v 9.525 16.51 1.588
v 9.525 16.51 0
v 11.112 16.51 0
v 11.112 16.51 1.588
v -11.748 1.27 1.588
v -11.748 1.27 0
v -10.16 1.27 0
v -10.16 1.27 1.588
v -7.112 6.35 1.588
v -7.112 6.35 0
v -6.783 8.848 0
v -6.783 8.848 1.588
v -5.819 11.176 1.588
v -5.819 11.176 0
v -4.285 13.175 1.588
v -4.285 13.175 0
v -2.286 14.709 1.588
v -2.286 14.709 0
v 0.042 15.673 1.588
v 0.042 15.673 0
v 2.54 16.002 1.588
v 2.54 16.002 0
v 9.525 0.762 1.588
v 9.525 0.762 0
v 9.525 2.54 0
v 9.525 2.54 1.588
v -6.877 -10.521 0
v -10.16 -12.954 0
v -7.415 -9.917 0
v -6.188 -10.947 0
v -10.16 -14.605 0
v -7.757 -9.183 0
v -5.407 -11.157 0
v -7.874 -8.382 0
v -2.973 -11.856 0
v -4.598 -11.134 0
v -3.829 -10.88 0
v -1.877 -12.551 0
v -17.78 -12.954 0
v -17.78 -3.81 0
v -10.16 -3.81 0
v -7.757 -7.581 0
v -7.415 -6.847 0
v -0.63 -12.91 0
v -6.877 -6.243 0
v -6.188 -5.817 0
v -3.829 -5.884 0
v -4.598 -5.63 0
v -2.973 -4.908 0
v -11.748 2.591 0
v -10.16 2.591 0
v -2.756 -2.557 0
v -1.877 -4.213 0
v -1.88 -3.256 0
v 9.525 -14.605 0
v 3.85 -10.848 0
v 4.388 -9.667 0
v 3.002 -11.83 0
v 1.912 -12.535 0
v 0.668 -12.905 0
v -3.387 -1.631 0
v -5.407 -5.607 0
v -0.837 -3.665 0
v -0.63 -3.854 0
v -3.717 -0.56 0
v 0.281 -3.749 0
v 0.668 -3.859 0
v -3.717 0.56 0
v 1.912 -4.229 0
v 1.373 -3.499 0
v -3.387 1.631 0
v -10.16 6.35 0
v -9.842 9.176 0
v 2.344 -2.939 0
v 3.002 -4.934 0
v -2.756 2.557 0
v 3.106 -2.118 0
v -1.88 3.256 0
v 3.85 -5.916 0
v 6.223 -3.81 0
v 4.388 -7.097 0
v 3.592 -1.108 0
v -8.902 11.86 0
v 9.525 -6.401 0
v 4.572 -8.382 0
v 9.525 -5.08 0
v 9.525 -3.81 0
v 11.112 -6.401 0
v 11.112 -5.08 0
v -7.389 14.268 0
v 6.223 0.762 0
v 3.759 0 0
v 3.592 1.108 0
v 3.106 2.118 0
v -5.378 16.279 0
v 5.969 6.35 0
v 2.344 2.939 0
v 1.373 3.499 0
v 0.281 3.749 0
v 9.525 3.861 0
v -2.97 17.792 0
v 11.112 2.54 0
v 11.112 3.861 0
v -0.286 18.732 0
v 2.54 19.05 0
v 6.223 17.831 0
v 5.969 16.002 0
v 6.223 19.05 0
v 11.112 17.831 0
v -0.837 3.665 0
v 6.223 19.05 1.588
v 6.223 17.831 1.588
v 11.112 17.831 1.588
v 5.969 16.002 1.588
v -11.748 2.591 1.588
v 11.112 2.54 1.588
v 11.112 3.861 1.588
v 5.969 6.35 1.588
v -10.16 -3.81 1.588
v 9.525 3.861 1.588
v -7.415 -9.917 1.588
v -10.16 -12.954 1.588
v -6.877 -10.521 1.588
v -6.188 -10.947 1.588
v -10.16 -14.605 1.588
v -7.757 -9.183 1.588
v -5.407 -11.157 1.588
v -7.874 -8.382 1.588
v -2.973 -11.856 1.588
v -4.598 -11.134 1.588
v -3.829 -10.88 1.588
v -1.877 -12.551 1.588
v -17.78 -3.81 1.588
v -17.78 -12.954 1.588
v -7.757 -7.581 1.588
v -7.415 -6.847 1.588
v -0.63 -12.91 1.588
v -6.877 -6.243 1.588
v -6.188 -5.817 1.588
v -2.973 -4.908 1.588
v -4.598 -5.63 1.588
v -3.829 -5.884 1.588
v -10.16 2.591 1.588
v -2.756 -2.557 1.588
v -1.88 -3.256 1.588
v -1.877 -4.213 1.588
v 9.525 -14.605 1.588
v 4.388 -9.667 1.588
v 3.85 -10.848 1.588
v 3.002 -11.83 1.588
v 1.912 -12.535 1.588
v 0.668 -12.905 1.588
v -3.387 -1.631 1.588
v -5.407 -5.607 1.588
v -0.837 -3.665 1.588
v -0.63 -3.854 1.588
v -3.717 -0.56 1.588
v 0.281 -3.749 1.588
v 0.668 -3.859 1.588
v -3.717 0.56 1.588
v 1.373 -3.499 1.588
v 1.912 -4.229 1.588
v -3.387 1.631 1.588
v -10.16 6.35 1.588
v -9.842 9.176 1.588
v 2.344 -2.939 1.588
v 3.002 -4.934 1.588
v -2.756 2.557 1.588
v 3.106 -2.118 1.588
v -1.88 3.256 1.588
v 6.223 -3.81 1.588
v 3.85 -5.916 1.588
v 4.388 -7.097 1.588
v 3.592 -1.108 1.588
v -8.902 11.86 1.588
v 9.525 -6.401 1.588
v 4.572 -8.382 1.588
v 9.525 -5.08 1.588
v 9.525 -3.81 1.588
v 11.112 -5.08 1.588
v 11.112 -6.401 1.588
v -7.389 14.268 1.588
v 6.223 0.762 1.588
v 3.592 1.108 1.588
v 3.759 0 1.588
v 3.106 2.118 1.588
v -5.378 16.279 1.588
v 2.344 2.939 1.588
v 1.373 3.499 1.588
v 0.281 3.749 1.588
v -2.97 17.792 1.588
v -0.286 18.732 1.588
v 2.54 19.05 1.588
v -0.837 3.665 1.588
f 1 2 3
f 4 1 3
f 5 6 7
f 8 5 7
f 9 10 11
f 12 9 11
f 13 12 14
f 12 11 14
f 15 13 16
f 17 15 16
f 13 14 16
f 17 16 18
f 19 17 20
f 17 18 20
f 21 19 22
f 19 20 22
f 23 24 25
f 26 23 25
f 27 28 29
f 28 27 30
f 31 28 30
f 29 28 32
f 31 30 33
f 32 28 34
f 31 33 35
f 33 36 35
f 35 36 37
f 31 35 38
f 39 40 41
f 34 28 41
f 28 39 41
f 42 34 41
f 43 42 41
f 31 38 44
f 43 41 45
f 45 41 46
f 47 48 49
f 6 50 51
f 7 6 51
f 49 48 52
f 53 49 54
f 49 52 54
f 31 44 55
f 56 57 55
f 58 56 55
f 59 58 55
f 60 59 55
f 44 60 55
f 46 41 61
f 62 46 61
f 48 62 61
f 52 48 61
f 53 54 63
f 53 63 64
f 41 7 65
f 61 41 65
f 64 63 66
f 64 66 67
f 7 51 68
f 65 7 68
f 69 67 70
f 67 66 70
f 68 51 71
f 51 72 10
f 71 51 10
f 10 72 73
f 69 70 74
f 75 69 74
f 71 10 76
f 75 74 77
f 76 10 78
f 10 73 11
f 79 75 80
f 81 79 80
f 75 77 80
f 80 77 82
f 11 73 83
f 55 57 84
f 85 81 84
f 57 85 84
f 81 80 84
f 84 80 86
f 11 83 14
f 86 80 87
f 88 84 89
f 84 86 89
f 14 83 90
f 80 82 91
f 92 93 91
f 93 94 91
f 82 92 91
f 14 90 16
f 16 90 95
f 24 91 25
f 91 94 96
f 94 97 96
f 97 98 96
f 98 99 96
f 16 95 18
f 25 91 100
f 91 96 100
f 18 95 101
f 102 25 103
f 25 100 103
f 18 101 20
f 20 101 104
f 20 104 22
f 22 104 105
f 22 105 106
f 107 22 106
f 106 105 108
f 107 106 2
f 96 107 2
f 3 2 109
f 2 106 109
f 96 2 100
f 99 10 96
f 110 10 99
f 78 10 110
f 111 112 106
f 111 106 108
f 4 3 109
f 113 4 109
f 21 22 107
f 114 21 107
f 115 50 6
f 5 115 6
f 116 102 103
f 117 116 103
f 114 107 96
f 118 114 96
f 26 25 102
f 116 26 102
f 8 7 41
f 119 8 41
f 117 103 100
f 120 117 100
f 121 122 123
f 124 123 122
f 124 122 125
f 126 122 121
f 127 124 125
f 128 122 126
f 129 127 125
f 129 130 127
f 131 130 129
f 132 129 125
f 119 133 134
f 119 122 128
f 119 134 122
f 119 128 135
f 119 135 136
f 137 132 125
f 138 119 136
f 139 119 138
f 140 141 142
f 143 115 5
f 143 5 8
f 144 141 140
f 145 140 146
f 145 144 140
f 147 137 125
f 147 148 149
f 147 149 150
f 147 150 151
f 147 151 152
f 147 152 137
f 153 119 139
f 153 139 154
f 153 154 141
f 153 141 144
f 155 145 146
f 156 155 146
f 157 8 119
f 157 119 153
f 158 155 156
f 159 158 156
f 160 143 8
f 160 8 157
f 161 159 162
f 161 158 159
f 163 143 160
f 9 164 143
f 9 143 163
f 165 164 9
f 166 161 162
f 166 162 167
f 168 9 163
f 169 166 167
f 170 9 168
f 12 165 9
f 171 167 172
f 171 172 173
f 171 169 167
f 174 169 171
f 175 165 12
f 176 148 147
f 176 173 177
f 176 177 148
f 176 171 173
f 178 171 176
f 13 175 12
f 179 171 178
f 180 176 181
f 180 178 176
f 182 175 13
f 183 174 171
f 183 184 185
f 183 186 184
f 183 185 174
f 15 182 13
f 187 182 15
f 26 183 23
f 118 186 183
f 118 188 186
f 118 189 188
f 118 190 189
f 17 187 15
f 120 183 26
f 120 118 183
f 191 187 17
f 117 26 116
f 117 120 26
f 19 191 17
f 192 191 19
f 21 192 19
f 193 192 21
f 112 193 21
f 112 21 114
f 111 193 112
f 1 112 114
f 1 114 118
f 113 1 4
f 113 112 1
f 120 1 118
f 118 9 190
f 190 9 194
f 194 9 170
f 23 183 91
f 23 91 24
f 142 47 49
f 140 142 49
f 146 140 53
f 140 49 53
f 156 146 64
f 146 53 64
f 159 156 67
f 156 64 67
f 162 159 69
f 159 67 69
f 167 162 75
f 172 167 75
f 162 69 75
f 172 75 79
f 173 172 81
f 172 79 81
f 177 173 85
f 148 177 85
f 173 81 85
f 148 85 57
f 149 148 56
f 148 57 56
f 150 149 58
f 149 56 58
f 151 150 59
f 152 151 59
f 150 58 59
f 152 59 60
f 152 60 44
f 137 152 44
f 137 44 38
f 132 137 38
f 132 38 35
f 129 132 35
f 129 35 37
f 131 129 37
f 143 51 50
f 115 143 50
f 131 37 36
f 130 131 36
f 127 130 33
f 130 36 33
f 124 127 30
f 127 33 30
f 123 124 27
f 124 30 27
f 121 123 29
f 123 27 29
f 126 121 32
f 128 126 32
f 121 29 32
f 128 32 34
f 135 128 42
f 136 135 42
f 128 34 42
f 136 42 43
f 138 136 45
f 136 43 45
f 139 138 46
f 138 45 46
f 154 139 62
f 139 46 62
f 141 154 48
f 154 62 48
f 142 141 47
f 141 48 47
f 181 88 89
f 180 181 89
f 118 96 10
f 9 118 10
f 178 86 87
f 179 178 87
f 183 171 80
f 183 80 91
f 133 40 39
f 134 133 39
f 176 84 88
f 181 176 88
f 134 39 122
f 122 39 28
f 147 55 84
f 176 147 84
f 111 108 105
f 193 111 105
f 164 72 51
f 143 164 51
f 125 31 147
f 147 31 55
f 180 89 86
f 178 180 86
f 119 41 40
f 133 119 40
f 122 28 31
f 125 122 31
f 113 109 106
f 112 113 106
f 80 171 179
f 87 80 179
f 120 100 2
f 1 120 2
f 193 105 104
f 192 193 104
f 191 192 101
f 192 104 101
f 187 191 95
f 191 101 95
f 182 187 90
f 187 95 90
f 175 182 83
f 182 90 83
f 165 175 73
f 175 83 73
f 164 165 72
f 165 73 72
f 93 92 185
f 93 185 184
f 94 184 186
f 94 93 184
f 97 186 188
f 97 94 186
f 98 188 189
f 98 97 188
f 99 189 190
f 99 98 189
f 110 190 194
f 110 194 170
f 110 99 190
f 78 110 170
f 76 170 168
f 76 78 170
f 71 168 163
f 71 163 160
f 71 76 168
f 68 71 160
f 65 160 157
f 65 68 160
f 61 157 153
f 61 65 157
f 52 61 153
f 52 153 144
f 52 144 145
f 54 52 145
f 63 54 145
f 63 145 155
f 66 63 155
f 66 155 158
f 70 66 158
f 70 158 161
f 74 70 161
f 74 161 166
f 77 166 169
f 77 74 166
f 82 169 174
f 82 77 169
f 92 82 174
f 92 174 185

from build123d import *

# Parameters (mm, degrees)
SKETCH1_R           = 3.7592
BOSS_EXTRUDE1_DEPTH = 1.5875
CUT_EXTRUDE1_REACH  = 28.107
SKETCH2_W           = 3.302
SKETCH2_H           = 4.572
SKETCH2_H_2         = 3.7592


with BuildPart() as part:
    # Sketch1 → Boss-Extrude1 (new body)
    with BuildSketch(Plane.XY):
        with BuildLine():
            Line((11.112499999, 17.8308), (9.524999999, 17.8308))
            Line((9.524999999, 17.8308), (9.524999999, 19.05))
            Line((9.524999999, 19.05), (2.54, 19.05))
            ThreePointArc((2.54, 19.05), (-6.440256121, 15.330256121), (-10.16, 6.35))
            Line((-10.16, 6.35), (-10.16, 2.5908))
            Line((-10.160000001, 2.5908), (-11.747500001, 2.5908))
            Line((-11.747500001, 2.5908), (-11.747500001, 1.27))
            Line((-11.747500001, 1.27), (-10.160000001, 1.27))
            Line((-10.160000001, 1.27), (-10.160000001, -3.81))
            Line((-10.160000001, -3.81), (-17.78, -3.81))
            Line((-17.78, -3.81), (-17.78, -12.954))
            Line((-17.78, -12.954), (-10.16, -12.954))
            Line((-10.160000001, -12.954), (-10.160000001, -14.605))
            Line((-10.160000001, -14.605), (9.524999999, -14.605))
            Line((9.524999999, -14.605), (9.524999999, -6.4008))
            Line((9.524999999, -6.4008), (11.112499999, -6.4008))
            Line((11.112499999, -6.4008), (11.112499999, -5.08))
            Line((11.112499999, -5.08), (9.524999999, -5.08))
            Line((9.524999999, -5.08), (9.524999999, 2.54))
            Line((9.525, 2.54), (11.1125, 2.54))
            Line((11.1125, 2.54), (11.1125, 3.8608))
            Line((11.1125, 3.8608), (9.525, 3.8608))
            Line((9.524999999, 3.8608), (9.524999999, 16.51))
            Line((9.524999999, 16.51), (11.112499999, 16.51))
            Line((11.112499999, 16.51), (11.112499999, 17.8308))
        make_face()
        with BuildLine():
            ThreePointArc((-7.112, 6.35), (-4.284994652, 13.174994652), (2.54, 16.002))
            Line((2.54, 16.002), (5.968999999, 16.002))
            Line((5.968999999, 16.002), (5.968999999, 6.35))
            Line((5.968999999, 6.35), (-7.112, 6.35))
        make_face(mode=Mode.SUBTRACT)
        with BuildLine():
            ThreePointArc((-3.82905, -5.883688551), (4.572, -8.382), (-3.82905, -10.880311449))
            ThreePointArc((-3.82905, -10.880311449), (-7.874, -8.382), (-3.82905, -5.883688551))
        make_face(mode=Mode.SUBTRACT)
        Circle(SKETCH1_R, mode=Mode.SUBTRACT)
    extrude(amount=BOSS_EXTRUDE1_DEPTH)

    # Sketch2 → Cut-Extrude1 (cut, up to next)
    with BuildSketch(Plane.XY.offset(1.5875), mode=Mode.PRIVATE) as cut_extrude1_sk1:
        with Locations((7.873999999, -1.524)):
            Rectangle(SKETCH2_W, SKETCH2_H)
    cut_extrude1_tool1 = extrude(cut_extrude1_sk1.sketch, amount=-CUT_EXTRUDE1_REACH, mode=Mode.PRIVATE) & part.part
    # Sketch2 → Cut-Extrude1 (cut, up to next)
    with BuildSketch(Plane.XY.offset(1.5875), mode=Mode.PRIVATE) as cut_extrude1_sk2:
        with Locations((7.873999999, 19.7104)):
            Rectangle(SKETCH2_W, SKETCH2_H_2)
    cut_extrude1_tool2 = extrude(cut_extrude1_sk2.sketch, amount=-CUT_EXTRUDE1_REACH, mode=Mode.PRIVATE) & part.part
    add(cut_extrude1_tool1.solids().sort_by_distance((7.874, -1.524, 1.5875))[0], mode=Mode.SUBTRACT)
    add(cut_extrude1_tool2.solids().sort_by_distance((7.874, 19.7104, 1.5875))[0], mode=Mode.SUBTRACT)


solid = part.part
